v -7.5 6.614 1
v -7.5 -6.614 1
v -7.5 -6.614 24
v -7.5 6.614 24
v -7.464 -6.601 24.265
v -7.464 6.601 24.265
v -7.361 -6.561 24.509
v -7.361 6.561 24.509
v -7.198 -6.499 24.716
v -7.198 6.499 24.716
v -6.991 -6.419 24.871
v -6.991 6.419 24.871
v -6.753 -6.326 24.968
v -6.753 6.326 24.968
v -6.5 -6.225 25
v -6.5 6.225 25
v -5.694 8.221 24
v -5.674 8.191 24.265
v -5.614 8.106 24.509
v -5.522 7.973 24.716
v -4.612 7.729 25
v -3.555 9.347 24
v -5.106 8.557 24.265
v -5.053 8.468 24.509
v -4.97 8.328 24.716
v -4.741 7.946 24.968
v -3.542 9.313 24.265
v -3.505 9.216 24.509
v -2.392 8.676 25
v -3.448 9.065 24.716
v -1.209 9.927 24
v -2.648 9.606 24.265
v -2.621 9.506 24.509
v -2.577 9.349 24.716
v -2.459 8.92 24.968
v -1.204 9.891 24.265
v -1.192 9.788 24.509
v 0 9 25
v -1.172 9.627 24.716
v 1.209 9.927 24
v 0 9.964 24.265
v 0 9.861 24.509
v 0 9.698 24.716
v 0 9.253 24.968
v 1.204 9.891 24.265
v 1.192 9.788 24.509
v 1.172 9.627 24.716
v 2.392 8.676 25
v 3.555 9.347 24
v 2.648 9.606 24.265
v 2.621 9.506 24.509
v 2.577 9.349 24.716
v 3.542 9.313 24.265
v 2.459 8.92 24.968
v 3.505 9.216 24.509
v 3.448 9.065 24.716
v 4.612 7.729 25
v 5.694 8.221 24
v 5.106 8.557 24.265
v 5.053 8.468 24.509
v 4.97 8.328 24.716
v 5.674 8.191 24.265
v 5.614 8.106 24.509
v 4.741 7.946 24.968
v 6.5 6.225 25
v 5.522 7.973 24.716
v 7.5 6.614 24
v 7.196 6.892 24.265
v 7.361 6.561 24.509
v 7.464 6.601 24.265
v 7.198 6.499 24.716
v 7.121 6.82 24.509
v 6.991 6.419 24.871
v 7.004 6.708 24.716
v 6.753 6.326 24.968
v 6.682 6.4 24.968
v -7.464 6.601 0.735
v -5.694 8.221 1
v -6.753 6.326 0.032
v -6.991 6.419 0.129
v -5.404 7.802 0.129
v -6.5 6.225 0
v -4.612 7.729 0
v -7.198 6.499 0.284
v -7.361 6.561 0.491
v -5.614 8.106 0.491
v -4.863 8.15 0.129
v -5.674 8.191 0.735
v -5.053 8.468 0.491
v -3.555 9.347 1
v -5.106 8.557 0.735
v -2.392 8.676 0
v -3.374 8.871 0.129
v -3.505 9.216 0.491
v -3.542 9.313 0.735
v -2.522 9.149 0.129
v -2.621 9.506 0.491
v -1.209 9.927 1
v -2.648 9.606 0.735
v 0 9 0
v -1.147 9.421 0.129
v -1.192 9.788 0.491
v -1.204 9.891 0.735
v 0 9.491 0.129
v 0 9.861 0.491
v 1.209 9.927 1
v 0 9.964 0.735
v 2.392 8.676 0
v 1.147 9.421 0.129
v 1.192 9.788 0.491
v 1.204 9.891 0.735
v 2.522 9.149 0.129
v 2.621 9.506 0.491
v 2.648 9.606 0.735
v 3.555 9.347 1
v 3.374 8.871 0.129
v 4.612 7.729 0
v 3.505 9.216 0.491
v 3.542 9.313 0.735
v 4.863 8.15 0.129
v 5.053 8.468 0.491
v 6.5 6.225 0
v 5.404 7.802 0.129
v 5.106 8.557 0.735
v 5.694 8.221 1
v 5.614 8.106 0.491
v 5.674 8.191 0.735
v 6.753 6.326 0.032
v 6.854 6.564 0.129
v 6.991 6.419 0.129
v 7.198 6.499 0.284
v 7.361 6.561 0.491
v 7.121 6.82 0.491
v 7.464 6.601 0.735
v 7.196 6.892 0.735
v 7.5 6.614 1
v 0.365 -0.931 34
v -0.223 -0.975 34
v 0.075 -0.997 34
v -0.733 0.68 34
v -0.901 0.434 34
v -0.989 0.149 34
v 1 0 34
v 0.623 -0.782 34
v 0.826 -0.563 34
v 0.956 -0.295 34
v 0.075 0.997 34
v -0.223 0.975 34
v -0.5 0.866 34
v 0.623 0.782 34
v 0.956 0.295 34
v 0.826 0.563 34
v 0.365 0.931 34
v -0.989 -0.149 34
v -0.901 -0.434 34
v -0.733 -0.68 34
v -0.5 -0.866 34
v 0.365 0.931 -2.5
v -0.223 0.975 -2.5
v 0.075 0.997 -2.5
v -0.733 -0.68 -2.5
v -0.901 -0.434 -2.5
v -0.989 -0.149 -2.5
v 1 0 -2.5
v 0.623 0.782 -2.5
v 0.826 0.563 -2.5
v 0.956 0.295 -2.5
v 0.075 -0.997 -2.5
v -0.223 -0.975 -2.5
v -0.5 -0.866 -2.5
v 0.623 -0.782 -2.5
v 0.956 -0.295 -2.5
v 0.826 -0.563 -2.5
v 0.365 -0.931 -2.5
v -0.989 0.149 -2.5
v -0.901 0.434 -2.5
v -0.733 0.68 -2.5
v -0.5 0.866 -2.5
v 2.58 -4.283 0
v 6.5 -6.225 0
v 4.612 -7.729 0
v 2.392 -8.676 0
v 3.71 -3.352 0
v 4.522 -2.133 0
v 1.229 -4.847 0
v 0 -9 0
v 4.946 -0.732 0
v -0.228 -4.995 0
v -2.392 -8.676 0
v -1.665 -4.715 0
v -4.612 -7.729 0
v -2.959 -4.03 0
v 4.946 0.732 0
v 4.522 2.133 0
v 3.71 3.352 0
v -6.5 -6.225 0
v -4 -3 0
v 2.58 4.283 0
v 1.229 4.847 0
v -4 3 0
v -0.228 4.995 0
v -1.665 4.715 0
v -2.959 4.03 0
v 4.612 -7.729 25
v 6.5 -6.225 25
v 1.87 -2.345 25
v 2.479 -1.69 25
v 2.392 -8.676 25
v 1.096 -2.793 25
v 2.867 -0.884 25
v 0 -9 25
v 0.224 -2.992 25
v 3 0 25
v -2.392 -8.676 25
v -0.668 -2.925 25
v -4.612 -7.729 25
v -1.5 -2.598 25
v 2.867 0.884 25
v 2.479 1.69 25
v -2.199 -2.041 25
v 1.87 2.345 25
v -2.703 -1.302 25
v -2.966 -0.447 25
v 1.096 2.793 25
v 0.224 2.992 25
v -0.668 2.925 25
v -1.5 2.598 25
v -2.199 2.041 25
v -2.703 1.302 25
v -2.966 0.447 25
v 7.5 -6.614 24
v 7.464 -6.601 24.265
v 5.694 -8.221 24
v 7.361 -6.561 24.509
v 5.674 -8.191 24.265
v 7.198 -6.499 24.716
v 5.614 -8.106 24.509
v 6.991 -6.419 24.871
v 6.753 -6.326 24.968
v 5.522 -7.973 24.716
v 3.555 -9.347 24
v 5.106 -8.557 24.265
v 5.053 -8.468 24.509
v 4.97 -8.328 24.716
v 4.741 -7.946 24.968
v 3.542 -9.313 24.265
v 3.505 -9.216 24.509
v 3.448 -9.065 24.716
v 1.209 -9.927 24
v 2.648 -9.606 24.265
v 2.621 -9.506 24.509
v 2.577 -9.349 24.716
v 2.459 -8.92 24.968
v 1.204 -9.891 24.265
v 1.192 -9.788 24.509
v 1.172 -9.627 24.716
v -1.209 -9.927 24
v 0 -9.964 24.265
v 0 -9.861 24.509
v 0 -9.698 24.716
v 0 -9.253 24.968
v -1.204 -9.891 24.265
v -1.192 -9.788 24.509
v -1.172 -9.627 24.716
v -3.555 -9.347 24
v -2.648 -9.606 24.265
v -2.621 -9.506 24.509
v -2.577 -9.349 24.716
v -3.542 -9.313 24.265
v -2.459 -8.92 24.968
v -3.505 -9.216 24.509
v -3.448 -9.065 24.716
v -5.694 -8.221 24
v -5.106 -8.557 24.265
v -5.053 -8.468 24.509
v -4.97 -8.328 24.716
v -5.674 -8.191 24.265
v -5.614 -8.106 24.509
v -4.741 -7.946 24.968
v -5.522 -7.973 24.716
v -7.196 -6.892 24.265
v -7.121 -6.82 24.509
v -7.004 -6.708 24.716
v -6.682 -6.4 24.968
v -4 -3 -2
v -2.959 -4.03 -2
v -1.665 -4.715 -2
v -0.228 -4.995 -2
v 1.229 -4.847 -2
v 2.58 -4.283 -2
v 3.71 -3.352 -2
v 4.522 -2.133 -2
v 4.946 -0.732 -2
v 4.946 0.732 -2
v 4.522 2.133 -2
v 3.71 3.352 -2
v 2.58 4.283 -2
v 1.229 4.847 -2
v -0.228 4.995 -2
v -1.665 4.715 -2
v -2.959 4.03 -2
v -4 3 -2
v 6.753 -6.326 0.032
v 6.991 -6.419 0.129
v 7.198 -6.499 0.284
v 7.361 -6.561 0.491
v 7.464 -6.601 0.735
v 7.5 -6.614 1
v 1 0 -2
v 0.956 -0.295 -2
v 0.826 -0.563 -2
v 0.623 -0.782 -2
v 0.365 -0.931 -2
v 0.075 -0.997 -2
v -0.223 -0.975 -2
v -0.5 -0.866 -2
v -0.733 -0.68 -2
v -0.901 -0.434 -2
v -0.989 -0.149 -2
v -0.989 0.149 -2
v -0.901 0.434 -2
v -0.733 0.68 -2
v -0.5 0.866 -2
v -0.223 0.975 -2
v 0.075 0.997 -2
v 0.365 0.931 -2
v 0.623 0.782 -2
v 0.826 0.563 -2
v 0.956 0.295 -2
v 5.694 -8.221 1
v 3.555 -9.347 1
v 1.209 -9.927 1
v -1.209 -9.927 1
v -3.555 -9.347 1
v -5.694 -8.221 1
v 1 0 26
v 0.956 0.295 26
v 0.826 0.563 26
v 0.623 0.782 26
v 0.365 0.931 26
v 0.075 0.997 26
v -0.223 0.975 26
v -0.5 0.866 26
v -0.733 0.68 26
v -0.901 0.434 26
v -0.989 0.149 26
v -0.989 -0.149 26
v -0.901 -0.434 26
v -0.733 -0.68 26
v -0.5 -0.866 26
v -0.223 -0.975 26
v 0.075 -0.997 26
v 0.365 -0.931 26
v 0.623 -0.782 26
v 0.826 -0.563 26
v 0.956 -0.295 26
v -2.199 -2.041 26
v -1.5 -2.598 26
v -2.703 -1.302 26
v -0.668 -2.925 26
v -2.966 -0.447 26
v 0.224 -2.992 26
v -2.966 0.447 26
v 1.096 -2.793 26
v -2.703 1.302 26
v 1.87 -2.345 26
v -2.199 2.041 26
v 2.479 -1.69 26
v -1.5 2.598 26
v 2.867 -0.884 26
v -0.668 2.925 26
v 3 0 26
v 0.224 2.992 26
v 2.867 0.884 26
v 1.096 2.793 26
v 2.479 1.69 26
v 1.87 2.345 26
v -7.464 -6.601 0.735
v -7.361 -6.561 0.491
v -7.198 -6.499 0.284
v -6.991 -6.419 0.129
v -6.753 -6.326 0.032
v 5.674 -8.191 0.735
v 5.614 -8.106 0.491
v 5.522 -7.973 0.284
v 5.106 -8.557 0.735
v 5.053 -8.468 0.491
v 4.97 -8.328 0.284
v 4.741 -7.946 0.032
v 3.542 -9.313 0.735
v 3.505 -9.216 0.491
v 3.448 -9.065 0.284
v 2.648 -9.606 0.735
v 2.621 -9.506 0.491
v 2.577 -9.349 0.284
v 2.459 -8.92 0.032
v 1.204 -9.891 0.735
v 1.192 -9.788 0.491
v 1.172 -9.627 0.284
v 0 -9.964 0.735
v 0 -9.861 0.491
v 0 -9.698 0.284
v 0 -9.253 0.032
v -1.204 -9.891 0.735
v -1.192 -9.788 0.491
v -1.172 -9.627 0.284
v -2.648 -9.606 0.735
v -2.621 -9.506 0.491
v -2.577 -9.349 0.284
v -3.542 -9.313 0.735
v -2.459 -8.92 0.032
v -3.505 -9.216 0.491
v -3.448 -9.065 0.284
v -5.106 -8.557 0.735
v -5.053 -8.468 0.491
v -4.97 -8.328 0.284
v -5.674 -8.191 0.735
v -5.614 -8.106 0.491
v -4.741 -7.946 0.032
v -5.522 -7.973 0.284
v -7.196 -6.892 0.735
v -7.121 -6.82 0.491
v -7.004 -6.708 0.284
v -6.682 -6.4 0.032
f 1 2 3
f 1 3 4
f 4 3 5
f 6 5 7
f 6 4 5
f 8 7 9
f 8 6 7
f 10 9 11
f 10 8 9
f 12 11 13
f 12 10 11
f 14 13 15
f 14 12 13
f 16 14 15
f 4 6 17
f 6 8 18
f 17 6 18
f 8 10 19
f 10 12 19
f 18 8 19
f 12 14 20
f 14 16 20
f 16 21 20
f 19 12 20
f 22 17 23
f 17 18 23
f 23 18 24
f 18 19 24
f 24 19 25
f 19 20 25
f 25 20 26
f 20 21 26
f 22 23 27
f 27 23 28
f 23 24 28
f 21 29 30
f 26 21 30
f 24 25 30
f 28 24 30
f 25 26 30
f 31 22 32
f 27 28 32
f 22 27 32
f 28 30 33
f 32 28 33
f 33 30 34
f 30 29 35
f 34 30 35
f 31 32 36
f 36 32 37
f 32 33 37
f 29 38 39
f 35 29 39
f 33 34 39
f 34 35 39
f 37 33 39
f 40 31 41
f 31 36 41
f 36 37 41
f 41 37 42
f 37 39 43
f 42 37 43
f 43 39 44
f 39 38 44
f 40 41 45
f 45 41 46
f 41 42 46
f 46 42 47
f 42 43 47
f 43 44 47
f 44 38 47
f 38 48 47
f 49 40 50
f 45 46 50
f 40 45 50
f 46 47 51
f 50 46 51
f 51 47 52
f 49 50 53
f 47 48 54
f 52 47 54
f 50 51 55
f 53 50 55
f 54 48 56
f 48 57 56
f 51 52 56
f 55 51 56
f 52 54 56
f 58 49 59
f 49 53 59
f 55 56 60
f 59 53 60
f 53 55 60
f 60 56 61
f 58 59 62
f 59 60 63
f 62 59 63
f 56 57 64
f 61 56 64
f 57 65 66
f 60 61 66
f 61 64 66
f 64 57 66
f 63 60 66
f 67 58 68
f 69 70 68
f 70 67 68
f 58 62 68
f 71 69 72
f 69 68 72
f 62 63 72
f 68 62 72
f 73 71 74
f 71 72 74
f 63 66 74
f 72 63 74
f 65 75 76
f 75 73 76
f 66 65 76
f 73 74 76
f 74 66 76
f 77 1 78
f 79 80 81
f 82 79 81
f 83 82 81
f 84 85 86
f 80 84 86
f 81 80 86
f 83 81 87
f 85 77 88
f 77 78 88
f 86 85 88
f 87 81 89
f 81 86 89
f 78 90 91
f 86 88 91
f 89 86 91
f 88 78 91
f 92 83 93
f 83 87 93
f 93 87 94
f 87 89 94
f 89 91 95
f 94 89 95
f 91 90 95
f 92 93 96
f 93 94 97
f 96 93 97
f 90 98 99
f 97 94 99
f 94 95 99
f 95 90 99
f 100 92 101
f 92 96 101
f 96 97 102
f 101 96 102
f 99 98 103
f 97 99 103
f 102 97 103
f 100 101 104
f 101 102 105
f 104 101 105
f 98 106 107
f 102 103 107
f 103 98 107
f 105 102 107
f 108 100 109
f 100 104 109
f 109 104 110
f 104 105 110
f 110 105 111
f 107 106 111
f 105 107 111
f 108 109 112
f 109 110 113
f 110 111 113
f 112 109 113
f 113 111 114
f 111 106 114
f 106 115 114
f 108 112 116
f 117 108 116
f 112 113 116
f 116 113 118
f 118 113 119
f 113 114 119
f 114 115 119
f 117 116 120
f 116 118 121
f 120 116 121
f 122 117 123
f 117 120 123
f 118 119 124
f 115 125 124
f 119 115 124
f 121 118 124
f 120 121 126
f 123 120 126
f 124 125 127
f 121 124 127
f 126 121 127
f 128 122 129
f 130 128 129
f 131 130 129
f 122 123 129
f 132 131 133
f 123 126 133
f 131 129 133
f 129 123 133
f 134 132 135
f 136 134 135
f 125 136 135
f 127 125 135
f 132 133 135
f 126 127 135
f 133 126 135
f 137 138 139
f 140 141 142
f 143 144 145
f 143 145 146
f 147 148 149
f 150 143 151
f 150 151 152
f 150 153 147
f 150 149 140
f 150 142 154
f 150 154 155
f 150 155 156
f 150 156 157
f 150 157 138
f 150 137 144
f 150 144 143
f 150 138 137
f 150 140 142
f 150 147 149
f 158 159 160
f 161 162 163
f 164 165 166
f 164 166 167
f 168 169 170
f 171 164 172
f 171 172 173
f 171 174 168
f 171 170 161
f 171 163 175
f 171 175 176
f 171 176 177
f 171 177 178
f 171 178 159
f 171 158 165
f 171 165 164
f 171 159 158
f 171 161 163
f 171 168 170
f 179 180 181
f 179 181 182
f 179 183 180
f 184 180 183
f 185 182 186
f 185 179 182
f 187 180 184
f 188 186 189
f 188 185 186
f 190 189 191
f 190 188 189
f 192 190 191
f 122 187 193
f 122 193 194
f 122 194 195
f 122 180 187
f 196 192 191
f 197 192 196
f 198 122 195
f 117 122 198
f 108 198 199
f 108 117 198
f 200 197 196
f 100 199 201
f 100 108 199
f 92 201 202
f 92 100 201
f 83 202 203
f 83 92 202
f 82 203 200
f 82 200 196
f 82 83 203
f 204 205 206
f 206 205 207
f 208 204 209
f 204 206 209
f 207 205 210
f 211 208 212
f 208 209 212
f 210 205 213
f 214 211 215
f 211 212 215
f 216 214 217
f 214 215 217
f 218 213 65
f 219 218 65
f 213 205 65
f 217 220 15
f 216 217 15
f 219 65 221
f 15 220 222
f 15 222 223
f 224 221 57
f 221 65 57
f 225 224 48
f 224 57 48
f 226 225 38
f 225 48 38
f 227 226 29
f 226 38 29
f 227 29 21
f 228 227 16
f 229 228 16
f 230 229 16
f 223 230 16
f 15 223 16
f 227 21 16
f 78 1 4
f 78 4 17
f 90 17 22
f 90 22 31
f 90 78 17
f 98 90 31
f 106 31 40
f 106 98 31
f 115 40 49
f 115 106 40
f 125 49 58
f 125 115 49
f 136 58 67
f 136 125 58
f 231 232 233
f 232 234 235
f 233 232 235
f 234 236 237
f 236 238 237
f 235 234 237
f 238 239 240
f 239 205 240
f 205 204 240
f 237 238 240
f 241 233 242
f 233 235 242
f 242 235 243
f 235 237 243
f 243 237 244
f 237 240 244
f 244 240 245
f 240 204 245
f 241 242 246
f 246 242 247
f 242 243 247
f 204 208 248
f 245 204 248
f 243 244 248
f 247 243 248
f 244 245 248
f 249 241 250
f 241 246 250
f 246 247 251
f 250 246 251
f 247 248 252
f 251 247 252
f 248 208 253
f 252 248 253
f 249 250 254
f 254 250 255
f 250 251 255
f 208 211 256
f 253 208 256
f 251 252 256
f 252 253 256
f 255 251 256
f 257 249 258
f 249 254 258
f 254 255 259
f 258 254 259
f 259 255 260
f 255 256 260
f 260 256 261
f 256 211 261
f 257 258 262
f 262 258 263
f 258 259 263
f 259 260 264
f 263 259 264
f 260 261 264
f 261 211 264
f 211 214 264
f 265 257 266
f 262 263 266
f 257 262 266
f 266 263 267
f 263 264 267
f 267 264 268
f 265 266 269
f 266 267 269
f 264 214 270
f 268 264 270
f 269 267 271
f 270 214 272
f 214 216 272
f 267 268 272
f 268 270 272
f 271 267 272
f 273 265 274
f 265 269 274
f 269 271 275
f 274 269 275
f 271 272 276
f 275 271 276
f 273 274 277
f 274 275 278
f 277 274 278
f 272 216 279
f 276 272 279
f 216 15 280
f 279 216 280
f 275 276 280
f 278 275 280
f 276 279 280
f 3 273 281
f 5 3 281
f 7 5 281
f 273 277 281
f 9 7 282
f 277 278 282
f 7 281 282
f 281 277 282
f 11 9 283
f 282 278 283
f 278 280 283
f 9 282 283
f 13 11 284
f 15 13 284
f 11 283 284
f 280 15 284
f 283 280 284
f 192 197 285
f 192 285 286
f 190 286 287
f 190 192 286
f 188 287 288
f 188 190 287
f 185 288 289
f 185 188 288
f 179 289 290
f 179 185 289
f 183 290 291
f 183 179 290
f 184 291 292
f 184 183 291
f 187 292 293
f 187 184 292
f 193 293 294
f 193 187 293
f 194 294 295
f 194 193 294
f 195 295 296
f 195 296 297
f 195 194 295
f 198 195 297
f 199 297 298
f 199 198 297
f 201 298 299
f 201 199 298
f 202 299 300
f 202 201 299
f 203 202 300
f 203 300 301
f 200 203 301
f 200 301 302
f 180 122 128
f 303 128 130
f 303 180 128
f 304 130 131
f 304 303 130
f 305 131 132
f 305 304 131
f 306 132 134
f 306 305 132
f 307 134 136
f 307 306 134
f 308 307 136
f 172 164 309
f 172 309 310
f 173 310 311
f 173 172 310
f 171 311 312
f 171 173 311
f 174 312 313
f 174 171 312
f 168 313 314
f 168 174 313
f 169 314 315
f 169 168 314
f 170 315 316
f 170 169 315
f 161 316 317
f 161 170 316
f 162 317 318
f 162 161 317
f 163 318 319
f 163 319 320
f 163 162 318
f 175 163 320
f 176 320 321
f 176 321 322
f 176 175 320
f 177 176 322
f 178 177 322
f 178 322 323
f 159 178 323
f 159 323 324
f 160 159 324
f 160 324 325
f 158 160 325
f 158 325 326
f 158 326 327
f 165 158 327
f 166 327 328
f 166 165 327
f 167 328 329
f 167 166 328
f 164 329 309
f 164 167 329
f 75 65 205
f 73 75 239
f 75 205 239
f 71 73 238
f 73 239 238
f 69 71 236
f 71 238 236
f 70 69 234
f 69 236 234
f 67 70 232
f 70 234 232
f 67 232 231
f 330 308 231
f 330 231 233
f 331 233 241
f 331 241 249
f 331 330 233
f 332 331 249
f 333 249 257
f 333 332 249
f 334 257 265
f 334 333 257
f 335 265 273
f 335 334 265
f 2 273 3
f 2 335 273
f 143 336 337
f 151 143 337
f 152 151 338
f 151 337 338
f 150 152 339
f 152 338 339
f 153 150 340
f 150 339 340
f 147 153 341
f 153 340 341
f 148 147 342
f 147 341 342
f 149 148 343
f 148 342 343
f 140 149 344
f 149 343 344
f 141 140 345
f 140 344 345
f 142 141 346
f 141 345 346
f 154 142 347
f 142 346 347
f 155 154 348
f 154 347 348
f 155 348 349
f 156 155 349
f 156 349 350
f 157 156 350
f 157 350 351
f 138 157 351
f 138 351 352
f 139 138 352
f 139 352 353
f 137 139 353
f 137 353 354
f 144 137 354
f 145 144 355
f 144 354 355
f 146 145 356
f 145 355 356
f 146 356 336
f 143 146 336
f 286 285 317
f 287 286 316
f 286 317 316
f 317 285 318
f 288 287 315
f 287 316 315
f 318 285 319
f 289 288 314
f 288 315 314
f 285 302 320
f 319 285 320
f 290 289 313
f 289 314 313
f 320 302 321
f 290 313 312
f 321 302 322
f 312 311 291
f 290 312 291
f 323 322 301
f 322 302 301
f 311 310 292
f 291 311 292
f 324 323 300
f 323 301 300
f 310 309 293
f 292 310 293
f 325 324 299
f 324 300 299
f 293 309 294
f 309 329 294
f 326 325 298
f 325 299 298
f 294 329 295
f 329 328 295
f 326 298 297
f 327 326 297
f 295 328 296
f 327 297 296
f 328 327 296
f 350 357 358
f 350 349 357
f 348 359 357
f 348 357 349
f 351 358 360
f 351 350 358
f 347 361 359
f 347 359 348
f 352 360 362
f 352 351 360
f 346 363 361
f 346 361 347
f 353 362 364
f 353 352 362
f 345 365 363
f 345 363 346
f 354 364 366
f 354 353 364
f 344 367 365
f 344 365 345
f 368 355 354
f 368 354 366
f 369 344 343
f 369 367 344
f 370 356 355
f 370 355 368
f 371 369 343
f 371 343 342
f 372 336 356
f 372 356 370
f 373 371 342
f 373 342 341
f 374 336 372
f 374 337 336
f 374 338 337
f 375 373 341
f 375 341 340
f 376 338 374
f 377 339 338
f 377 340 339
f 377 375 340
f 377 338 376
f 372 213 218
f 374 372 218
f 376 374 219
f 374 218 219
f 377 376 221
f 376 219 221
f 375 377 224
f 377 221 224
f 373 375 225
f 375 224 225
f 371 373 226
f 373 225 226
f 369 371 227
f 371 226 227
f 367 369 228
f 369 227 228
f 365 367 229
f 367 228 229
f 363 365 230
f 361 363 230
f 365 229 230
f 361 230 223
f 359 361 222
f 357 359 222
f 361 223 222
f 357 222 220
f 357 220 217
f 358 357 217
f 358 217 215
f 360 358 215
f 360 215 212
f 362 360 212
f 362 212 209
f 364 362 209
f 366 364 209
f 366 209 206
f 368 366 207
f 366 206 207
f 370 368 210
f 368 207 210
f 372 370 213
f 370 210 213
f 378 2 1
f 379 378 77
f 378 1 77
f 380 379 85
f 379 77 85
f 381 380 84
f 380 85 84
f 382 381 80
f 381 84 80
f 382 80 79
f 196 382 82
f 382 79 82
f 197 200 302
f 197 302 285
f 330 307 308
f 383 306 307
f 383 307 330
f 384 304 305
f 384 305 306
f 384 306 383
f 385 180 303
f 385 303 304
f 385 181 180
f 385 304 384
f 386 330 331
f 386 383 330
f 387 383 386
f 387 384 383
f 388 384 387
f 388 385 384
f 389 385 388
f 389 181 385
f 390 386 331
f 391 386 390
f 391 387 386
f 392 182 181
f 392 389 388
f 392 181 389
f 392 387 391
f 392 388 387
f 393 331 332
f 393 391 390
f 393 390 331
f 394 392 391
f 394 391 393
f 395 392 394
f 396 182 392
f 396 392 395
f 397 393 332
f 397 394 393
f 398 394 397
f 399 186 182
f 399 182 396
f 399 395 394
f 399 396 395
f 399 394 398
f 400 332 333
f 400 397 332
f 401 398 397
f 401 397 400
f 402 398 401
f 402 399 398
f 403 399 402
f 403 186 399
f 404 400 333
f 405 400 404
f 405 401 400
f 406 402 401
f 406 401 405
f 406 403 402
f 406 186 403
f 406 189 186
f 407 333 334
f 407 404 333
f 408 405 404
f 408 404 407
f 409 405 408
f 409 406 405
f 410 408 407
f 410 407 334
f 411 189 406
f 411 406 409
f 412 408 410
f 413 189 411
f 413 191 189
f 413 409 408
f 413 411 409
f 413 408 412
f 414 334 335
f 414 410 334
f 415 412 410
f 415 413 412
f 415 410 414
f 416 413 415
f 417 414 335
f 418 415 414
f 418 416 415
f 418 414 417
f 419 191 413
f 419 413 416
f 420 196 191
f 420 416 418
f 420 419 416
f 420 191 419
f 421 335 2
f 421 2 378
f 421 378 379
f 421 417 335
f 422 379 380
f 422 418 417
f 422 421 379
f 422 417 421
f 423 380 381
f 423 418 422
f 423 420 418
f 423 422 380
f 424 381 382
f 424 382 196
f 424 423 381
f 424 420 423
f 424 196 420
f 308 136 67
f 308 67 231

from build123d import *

# Parameters (mm, degrees)
BOSS_EXTRUDE1_DEPTH = 25
SKETCH2_R           = 3
BOSS_EXTRUDE2_DEPTH = 1
SKETCH3_R           = 1
BOSS_EXTRUDE3_DEPTH = 8
BOSS_EXTRUDE4_DEPTH = 2
BOSS_EXTRUDE5_START = 0.5
SKETCH5_R           = 1
BOSS_EXTRUDE5_DEPTH = 0.5
FILLET1_R           = 1
FILLET2_R           = 1


with BuildPart() as part:
    # Sketch1 → Boss-Extrude1 (new body)
    with BuildSketch(Plane.XY):
        with BuildLine():
            Line((-7.5, -6.614378278), (-7.5, 6.614378278))
            ThreePointArc((-7.5, 6.614378278), (0, 10), (7.5, 6.614378278))
            Line((7.5, 6.614378278), (7.5, -6.614378278))
            ThreePointArc((7.5, -6.614378278), (0, -10), (-7.5, -6.614378278))
        make_face()
    extrude(amount=BOSS_EXTRUDE1_DEPTH)

    # Sketch2 → Boss-Extrude2 (add)
    with BuildSketch(Plane.XY.offset(25)):
        Circle(SKETCH2_R)
    extrude(amount=BOSS_EXTRUDE2_DEPTH)

    # Sketch3 → Boss-Extrude3 (add)
    with BuildSketch(Plane.XY.offset(26)):
        Circle(SKETCH3_R)
    extrude(amount=BOSS_EXTRUDE3_DEPTH)

    # Sketch4 → Boss-Extrude4 (add)
    with BuildSketch(Plane(origin=(0, 0, 0), x_dir=(-1, 0, 0), z_dir=(0, 0, -1))):
        with BuildLine():
            Line((4, 3), (4, -3))
            ThreePointArc((4, -3), (-5, 0), (4, 3))
        make_face()
    extrude(amount=BOSS_EXTRUDE4_DEPTH)

    # Sketch5 → Boss-Extrude5 (add)
    with BuildSketch(Plane(origin=(0, 0, -2), x_dir=(-1, 0, 0), z_dir=(0, 0, -1)).offset(BOSS_EXTRUDE5_START)):
        with Locations(Location((0, 0, 0), (0, 0, 180))):
            Circle(SKETCH5_R)
    extrude(amount=-BOSS_EXTRUDE5_DEPTH)

    # Fillet1
    fillet1_edges = [part.edges().sort_by_distance(p)[0] for p in [
        (0, -10, 25),
        (7.5, 0, 25),
        (0, 10, 25),
        (-7.5, 0, 25),
    ]]
    fillet(fillet1_edges, radius=FILLET1_R)

    # Fillet2
    fillet2_edges = [part.edges().sort_by_distance(p)[0] for p in [
        (7.5, 0, 0),
        (0, -10, 0),
        (-7.5, 0, 0),
        (0, 10, 0),
    ]]
    fillet(fillet2_edges, radius=FILLET2_R)


solid = part.part
